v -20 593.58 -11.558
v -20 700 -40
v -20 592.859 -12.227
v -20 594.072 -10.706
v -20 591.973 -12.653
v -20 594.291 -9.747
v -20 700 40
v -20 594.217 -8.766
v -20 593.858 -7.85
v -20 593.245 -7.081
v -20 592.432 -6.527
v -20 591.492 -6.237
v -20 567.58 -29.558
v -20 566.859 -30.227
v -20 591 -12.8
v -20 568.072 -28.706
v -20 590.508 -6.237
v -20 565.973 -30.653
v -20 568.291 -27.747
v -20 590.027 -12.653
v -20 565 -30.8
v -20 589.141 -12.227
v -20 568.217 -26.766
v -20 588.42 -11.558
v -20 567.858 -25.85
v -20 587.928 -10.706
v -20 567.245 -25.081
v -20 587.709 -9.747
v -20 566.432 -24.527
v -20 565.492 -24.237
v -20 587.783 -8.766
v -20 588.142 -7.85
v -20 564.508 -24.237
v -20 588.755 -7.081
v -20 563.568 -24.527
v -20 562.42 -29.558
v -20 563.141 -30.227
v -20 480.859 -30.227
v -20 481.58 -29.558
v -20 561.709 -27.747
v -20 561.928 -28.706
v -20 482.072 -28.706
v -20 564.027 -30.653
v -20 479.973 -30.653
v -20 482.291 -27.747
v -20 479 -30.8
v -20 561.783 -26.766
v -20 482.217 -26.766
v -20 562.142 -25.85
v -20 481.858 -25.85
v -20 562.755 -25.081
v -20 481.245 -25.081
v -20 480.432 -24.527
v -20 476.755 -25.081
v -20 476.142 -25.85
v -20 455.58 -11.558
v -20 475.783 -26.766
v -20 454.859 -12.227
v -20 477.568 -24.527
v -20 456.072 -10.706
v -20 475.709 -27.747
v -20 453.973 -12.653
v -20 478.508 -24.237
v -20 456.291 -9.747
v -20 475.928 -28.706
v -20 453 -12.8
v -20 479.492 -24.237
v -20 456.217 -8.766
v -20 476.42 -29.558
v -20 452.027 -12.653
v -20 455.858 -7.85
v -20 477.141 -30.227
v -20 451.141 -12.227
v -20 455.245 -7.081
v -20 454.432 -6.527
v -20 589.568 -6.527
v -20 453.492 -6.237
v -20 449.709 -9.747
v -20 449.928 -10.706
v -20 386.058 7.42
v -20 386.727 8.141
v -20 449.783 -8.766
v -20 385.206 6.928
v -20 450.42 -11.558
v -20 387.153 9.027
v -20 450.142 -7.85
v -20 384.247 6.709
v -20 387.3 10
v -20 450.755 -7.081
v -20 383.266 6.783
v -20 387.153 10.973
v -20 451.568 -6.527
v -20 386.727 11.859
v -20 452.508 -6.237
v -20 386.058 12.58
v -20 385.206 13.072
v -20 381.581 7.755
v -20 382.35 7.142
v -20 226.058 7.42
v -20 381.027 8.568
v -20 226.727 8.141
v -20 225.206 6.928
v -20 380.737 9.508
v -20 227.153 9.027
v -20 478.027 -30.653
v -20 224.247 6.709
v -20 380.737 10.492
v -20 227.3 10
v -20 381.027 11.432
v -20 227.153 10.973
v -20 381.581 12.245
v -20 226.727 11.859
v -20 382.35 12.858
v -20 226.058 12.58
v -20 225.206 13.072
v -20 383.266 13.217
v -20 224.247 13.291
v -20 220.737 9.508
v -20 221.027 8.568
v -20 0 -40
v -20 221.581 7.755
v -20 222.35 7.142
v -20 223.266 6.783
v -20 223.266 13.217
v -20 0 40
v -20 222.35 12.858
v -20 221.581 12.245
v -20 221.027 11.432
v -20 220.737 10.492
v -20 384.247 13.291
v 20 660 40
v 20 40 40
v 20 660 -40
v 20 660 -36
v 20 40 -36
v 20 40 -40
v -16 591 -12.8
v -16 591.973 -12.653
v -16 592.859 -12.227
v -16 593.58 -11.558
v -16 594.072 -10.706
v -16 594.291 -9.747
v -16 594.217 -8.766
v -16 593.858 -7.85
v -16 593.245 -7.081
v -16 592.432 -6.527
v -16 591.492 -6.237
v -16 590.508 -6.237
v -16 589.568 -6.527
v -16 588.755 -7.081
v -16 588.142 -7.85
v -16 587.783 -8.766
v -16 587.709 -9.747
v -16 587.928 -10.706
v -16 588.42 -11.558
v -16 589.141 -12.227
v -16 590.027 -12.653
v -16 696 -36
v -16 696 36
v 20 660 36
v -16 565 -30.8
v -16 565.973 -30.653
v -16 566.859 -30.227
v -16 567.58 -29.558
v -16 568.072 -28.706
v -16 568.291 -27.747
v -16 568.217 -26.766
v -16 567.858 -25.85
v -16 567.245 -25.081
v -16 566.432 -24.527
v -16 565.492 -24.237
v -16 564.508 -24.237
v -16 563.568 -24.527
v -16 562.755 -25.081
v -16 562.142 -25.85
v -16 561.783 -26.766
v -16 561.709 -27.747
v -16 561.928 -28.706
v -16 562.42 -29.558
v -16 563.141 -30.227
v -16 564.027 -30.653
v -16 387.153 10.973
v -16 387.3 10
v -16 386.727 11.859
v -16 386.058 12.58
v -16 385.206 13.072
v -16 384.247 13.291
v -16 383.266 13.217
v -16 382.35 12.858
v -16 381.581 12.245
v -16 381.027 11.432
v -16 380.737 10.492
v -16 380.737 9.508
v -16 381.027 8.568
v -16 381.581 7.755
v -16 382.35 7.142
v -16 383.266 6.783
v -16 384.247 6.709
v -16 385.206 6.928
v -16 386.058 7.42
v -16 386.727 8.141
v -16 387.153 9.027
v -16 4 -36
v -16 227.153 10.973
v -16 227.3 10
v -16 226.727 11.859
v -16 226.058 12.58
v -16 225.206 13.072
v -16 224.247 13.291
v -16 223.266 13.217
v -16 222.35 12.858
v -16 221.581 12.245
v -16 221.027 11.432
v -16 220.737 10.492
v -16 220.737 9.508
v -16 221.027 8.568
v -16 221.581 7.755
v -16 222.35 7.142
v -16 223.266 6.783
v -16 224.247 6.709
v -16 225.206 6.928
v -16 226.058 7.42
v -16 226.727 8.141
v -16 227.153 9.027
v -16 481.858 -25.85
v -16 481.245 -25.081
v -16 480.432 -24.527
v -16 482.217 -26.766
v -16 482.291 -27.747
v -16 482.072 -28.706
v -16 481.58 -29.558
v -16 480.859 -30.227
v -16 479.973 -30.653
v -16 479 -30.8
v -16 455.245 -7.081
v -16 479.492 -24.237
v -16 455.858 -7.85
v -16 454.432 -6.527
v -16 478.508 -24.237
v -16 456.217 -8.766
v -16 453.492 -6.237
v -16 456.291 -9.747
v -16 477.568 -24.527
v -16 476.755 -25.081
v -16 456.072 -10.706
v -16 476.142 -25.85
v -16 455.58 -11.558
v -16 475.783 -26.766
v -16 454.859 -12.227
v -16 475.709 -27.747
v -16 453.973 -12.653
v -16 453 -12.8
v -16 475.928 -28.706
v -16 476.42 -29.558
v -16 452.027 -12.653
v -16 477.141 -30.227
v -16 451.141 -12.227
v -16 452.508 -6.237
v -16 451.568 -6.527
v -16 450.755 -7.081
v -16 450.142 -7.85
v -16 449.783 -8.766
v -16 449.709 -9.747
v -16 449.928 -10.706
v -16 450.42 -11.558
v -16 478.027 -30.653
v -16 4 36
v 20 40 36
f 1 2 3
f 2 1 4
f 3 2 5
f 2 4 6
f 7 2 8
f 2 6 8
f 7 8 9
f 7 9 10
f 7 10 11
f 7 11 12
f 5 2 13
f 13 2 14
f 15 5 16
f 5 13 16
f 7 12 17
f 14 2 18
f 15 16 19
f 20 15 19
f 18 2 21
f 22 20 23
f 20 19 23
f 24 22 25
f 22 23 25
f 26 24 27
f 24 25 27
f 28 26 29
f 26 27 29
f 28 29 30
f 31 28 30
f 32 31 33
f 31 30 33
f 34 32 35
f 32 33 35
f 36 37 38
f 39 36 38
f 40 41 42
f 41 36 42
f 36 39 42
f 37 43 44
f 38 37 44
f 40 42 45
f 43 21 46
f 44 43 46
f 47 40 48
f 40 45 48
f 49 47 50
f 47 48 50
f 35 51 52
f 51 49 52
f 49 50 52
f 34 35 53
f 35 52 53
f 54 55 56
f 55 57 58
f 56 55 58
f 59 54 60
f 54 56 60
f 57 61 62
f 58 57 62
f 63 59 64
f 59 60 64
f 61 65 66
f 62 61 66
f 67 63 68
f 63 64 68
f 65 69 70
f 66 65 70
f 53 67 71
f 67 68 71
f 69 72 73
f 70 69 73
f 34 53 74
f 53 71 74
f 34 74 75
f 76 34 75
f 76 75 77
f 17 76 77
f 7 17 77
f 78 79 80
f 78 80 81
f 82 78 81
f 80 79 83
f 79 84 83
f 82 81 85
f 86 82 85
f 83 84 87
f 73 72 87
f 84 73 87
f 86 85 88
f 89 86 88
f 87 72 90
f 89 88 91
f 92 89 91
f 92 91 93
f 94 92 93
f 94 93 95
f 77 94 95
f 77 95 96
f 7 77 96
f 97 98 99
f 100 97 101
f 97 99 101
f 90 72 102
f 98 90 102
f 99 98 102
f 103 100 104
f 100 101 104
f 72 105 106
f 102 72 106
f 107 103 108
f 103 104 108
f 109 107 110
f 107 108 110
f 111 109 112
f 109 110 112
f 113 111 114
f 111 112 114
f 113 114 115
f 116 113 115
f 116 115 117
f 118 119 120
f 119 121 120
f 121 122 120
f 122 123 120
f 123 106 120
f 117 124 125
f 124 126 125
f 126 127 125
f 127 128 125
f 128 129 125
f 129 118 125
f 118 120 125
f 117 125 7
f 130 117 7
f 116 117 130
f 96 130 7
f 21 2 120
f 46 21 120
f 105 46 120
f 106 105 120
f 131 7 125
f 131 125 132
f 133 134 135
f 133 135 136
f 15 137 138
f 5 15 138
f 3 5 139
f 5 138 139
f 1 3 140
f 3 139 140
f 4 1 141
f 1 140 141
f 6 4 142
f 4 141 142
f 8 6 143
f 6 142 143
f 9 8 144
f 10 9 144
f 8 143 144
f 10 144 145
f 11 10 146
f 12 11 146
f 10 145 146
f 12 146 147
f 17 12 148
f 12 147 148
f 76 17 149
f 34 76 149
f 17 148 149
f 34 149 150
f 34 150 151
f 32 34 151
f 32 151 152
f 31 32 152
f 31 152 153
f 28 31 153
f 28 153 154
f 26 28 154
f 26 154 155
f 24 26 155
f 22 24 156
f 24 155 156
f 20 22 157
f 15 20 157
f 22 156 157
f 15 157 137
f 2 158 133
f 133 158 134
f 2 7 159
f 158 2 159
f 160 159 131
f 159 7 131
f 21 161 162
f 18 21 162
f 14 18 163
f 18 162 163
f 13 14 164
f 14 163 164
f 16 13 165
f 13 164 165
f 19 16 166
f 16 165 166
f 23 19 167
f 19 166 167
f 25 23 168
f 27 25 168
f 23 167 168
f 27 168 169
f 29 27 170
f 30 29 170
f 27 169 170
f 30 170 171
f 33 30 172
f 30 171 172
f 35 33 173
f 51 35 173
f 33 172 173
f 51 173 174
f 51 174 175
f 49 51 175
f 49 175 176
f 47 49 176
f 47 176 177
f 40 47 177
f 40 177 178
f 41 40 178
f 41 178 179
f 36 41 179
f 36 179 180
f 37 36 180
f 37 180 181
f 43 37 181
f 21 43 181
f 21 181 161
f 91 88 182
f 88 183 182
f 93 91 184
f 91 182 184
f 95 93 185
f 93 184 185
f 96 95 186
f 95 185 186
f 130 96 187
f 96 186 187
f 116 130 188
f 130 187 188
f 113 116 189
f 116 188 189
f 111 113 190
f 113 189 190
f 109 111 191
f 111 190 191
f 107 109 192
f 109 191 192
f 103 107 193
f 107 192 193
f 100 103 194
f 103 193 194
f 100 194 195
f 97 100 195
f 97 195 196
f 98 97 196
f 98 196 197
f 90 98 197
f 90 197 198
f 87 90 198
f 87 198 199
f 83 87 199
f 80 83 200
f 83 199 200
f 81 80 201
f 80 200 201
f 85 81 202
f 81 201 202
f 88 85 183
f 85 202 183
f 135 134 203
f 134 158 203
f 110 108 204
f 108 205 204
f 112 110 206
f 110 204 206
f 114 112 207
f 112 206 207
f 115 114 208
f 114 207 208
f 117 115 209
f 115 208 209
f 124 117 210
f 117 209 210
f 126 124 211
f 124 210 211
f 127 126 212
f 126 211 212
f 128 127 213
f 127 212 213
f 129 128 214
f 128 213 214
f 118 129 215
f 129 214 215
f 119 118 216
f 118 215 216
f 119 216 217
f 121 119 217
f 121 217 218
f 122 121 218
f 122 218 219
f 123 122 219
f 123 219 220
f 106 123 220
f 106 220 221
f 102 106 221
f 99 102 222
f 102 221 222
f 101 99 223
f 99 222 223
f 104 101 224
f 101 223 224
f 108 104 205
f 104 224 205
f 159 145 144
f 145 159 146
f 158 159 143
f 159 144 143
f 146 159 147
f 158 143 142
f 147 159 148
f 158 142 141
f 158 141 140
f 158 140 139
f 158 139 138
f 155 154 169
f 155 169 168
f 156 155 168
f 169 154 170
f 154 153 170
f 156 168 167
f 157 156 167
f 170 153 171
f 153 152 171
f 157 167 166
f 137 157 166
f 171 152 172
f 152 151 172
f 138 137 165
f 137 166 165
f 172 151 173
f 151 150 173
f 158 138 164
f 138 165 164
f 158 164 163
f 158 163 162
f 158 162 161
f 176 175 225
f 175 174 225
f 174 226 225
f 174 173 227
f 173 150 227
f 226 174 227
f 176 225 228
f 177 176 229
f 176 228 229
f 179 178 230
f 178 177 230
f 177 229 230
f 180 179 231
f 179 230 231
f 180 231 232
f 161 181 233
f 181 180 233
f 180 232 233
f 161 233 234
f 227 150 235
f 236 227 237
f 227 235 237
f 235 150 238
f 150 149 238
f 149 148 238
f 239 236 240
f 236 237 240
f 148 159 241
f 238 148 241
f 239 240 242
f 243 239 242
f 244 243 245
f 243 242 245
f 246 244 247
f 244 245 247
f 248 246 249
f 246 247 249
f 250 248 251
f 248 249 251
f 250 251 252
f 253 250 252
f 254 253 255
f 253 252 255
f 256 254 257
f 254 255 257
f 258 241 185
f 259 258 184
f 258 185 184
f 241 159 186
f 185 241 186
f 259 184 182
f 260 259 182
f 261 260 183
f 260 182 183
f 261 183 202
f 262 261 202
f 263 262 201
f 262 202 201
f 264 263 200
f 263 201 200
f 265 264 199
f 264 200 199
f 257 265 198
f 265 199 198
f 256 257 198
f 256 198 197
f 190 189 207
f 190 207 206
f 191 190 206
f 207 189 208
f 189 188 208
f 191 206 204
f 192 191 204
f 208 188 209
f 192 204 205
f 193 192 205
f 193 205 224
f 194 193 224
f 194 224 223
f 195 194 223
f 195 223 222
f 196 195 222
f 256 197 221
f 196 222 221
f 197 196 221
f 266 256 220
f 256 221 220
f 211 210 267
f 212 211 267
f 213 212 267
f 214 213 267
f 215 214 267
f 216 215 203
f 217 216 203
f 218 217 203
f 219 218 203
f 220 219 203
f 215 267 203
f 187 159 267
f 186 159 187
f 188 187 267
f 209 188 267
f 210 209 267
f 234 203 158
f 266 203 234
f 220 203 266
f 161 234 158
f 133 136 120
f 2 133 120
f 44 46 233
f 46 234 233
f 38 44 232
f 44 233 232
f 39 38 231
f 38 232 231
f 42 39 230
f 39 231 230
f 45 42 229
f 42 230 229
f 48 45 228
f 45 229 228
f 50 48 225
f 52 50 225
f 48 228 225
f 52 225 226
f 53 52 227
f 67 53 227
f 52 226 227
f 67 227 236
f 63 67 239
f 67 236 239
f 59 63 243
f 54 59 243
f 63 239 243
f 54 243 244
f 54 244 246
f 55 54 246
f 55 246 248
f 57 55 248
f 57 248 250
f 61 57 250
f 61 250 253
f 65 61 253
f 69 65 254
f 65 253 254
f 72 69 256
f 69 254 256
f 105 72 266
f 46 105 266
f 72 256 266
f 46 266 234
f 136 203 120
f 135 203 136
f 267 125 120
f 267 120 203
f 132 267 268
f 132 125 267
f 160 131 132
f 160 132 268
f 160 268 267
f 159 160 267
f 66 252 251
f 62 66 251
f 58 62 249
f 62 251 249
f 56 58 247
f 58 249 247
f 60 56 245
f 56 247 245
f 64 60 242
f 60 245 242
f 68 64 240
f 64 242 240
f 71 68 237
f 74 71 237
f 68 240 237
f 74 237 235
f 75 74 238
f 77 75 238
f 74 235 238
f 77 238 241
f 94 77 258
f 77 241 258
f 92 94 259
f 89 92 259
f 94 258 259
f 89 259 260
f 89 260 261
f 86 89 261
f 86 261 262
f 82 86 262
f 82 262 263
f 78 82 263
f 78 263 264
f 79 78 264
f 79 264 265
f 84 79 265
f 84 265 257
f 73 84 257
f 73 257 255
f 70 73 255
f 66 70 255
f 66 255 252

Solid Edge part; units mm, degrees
sketch "Sketch1" plane through (0, 0, 0) normal (0, -1, 0) x (1, 0, 0)
  line L0 (20, 36) -> (-16, 36)
  line L1 (-16, 36) -> (-16, -36)
  line L2 (-16, -36) -> (20, -36)
  line L3 (20, -36) -> (20, -40)
  line L4 (20, -40) -> (-20, -40)
  line L5 (-20, -40) -> (-20, 40)
  line L6 (-20, 40) -> (20, 40)
  line L7 (20, 40) -> (20, 36)
  dimension "D1" = 40
  dimension "D2" = 4
  dimension "D3" = 4
  dimension "D4" = 80
  dimension "D5" = 4
extrude "Protrusion1" add sketch "Sketch1" against normal blind 700
sketch "Sketch2" plane through (0, 350, 40) normal (0, 0, 1) x (0, 1, 0)
  line L0 (-350, 20) -> (-310, -20)
extrude "Cutout1" cut sketch "Sketch2" against normal through all material side at (0.0354, 19.9646, 40)
sketch "Sketch3" plane through (0, 350, 40) normal (0, 0, 1) x (0, 1, 0)
  line L0 (350, 20) -> (310, -20)
extrude "Cutout2" cut sketch "Sketch3" against normal through all material side at (0.0354, 680.0354, 40)
sketch "Sketch4" plane through (-16, 350, 0) normal (1, 0, 0) x (0, 1, 0)
  circle A0 centre (-126, 10) radius 3.3
  circle A1 centre (34, 10) radius 3.3
  dimension "D1" = 6.6
  dimension "D2" = 160
  dimension "D3" = 50
  dimension "D4" = 316
extrude "Cutout3" cut sketch "Sketch4" against normal through all
hole "Bohrung_1" at (-16, 591, -9.5) direction (-1, 0, 0) diameter 6.6 end up to next
hole "Hole1" at (-16, 565, -27.5) direction (-1, 0, 0) diameter 6.6 end up to next
hole "Hole2" at (-16, 453, -9.5) direction (-1, 0, 0) diameter 6.6 end up to next
hole "Hole3" at (-16, 479, -27.5) direction (-1, 0, 0) diameter 6.6 end up to next
